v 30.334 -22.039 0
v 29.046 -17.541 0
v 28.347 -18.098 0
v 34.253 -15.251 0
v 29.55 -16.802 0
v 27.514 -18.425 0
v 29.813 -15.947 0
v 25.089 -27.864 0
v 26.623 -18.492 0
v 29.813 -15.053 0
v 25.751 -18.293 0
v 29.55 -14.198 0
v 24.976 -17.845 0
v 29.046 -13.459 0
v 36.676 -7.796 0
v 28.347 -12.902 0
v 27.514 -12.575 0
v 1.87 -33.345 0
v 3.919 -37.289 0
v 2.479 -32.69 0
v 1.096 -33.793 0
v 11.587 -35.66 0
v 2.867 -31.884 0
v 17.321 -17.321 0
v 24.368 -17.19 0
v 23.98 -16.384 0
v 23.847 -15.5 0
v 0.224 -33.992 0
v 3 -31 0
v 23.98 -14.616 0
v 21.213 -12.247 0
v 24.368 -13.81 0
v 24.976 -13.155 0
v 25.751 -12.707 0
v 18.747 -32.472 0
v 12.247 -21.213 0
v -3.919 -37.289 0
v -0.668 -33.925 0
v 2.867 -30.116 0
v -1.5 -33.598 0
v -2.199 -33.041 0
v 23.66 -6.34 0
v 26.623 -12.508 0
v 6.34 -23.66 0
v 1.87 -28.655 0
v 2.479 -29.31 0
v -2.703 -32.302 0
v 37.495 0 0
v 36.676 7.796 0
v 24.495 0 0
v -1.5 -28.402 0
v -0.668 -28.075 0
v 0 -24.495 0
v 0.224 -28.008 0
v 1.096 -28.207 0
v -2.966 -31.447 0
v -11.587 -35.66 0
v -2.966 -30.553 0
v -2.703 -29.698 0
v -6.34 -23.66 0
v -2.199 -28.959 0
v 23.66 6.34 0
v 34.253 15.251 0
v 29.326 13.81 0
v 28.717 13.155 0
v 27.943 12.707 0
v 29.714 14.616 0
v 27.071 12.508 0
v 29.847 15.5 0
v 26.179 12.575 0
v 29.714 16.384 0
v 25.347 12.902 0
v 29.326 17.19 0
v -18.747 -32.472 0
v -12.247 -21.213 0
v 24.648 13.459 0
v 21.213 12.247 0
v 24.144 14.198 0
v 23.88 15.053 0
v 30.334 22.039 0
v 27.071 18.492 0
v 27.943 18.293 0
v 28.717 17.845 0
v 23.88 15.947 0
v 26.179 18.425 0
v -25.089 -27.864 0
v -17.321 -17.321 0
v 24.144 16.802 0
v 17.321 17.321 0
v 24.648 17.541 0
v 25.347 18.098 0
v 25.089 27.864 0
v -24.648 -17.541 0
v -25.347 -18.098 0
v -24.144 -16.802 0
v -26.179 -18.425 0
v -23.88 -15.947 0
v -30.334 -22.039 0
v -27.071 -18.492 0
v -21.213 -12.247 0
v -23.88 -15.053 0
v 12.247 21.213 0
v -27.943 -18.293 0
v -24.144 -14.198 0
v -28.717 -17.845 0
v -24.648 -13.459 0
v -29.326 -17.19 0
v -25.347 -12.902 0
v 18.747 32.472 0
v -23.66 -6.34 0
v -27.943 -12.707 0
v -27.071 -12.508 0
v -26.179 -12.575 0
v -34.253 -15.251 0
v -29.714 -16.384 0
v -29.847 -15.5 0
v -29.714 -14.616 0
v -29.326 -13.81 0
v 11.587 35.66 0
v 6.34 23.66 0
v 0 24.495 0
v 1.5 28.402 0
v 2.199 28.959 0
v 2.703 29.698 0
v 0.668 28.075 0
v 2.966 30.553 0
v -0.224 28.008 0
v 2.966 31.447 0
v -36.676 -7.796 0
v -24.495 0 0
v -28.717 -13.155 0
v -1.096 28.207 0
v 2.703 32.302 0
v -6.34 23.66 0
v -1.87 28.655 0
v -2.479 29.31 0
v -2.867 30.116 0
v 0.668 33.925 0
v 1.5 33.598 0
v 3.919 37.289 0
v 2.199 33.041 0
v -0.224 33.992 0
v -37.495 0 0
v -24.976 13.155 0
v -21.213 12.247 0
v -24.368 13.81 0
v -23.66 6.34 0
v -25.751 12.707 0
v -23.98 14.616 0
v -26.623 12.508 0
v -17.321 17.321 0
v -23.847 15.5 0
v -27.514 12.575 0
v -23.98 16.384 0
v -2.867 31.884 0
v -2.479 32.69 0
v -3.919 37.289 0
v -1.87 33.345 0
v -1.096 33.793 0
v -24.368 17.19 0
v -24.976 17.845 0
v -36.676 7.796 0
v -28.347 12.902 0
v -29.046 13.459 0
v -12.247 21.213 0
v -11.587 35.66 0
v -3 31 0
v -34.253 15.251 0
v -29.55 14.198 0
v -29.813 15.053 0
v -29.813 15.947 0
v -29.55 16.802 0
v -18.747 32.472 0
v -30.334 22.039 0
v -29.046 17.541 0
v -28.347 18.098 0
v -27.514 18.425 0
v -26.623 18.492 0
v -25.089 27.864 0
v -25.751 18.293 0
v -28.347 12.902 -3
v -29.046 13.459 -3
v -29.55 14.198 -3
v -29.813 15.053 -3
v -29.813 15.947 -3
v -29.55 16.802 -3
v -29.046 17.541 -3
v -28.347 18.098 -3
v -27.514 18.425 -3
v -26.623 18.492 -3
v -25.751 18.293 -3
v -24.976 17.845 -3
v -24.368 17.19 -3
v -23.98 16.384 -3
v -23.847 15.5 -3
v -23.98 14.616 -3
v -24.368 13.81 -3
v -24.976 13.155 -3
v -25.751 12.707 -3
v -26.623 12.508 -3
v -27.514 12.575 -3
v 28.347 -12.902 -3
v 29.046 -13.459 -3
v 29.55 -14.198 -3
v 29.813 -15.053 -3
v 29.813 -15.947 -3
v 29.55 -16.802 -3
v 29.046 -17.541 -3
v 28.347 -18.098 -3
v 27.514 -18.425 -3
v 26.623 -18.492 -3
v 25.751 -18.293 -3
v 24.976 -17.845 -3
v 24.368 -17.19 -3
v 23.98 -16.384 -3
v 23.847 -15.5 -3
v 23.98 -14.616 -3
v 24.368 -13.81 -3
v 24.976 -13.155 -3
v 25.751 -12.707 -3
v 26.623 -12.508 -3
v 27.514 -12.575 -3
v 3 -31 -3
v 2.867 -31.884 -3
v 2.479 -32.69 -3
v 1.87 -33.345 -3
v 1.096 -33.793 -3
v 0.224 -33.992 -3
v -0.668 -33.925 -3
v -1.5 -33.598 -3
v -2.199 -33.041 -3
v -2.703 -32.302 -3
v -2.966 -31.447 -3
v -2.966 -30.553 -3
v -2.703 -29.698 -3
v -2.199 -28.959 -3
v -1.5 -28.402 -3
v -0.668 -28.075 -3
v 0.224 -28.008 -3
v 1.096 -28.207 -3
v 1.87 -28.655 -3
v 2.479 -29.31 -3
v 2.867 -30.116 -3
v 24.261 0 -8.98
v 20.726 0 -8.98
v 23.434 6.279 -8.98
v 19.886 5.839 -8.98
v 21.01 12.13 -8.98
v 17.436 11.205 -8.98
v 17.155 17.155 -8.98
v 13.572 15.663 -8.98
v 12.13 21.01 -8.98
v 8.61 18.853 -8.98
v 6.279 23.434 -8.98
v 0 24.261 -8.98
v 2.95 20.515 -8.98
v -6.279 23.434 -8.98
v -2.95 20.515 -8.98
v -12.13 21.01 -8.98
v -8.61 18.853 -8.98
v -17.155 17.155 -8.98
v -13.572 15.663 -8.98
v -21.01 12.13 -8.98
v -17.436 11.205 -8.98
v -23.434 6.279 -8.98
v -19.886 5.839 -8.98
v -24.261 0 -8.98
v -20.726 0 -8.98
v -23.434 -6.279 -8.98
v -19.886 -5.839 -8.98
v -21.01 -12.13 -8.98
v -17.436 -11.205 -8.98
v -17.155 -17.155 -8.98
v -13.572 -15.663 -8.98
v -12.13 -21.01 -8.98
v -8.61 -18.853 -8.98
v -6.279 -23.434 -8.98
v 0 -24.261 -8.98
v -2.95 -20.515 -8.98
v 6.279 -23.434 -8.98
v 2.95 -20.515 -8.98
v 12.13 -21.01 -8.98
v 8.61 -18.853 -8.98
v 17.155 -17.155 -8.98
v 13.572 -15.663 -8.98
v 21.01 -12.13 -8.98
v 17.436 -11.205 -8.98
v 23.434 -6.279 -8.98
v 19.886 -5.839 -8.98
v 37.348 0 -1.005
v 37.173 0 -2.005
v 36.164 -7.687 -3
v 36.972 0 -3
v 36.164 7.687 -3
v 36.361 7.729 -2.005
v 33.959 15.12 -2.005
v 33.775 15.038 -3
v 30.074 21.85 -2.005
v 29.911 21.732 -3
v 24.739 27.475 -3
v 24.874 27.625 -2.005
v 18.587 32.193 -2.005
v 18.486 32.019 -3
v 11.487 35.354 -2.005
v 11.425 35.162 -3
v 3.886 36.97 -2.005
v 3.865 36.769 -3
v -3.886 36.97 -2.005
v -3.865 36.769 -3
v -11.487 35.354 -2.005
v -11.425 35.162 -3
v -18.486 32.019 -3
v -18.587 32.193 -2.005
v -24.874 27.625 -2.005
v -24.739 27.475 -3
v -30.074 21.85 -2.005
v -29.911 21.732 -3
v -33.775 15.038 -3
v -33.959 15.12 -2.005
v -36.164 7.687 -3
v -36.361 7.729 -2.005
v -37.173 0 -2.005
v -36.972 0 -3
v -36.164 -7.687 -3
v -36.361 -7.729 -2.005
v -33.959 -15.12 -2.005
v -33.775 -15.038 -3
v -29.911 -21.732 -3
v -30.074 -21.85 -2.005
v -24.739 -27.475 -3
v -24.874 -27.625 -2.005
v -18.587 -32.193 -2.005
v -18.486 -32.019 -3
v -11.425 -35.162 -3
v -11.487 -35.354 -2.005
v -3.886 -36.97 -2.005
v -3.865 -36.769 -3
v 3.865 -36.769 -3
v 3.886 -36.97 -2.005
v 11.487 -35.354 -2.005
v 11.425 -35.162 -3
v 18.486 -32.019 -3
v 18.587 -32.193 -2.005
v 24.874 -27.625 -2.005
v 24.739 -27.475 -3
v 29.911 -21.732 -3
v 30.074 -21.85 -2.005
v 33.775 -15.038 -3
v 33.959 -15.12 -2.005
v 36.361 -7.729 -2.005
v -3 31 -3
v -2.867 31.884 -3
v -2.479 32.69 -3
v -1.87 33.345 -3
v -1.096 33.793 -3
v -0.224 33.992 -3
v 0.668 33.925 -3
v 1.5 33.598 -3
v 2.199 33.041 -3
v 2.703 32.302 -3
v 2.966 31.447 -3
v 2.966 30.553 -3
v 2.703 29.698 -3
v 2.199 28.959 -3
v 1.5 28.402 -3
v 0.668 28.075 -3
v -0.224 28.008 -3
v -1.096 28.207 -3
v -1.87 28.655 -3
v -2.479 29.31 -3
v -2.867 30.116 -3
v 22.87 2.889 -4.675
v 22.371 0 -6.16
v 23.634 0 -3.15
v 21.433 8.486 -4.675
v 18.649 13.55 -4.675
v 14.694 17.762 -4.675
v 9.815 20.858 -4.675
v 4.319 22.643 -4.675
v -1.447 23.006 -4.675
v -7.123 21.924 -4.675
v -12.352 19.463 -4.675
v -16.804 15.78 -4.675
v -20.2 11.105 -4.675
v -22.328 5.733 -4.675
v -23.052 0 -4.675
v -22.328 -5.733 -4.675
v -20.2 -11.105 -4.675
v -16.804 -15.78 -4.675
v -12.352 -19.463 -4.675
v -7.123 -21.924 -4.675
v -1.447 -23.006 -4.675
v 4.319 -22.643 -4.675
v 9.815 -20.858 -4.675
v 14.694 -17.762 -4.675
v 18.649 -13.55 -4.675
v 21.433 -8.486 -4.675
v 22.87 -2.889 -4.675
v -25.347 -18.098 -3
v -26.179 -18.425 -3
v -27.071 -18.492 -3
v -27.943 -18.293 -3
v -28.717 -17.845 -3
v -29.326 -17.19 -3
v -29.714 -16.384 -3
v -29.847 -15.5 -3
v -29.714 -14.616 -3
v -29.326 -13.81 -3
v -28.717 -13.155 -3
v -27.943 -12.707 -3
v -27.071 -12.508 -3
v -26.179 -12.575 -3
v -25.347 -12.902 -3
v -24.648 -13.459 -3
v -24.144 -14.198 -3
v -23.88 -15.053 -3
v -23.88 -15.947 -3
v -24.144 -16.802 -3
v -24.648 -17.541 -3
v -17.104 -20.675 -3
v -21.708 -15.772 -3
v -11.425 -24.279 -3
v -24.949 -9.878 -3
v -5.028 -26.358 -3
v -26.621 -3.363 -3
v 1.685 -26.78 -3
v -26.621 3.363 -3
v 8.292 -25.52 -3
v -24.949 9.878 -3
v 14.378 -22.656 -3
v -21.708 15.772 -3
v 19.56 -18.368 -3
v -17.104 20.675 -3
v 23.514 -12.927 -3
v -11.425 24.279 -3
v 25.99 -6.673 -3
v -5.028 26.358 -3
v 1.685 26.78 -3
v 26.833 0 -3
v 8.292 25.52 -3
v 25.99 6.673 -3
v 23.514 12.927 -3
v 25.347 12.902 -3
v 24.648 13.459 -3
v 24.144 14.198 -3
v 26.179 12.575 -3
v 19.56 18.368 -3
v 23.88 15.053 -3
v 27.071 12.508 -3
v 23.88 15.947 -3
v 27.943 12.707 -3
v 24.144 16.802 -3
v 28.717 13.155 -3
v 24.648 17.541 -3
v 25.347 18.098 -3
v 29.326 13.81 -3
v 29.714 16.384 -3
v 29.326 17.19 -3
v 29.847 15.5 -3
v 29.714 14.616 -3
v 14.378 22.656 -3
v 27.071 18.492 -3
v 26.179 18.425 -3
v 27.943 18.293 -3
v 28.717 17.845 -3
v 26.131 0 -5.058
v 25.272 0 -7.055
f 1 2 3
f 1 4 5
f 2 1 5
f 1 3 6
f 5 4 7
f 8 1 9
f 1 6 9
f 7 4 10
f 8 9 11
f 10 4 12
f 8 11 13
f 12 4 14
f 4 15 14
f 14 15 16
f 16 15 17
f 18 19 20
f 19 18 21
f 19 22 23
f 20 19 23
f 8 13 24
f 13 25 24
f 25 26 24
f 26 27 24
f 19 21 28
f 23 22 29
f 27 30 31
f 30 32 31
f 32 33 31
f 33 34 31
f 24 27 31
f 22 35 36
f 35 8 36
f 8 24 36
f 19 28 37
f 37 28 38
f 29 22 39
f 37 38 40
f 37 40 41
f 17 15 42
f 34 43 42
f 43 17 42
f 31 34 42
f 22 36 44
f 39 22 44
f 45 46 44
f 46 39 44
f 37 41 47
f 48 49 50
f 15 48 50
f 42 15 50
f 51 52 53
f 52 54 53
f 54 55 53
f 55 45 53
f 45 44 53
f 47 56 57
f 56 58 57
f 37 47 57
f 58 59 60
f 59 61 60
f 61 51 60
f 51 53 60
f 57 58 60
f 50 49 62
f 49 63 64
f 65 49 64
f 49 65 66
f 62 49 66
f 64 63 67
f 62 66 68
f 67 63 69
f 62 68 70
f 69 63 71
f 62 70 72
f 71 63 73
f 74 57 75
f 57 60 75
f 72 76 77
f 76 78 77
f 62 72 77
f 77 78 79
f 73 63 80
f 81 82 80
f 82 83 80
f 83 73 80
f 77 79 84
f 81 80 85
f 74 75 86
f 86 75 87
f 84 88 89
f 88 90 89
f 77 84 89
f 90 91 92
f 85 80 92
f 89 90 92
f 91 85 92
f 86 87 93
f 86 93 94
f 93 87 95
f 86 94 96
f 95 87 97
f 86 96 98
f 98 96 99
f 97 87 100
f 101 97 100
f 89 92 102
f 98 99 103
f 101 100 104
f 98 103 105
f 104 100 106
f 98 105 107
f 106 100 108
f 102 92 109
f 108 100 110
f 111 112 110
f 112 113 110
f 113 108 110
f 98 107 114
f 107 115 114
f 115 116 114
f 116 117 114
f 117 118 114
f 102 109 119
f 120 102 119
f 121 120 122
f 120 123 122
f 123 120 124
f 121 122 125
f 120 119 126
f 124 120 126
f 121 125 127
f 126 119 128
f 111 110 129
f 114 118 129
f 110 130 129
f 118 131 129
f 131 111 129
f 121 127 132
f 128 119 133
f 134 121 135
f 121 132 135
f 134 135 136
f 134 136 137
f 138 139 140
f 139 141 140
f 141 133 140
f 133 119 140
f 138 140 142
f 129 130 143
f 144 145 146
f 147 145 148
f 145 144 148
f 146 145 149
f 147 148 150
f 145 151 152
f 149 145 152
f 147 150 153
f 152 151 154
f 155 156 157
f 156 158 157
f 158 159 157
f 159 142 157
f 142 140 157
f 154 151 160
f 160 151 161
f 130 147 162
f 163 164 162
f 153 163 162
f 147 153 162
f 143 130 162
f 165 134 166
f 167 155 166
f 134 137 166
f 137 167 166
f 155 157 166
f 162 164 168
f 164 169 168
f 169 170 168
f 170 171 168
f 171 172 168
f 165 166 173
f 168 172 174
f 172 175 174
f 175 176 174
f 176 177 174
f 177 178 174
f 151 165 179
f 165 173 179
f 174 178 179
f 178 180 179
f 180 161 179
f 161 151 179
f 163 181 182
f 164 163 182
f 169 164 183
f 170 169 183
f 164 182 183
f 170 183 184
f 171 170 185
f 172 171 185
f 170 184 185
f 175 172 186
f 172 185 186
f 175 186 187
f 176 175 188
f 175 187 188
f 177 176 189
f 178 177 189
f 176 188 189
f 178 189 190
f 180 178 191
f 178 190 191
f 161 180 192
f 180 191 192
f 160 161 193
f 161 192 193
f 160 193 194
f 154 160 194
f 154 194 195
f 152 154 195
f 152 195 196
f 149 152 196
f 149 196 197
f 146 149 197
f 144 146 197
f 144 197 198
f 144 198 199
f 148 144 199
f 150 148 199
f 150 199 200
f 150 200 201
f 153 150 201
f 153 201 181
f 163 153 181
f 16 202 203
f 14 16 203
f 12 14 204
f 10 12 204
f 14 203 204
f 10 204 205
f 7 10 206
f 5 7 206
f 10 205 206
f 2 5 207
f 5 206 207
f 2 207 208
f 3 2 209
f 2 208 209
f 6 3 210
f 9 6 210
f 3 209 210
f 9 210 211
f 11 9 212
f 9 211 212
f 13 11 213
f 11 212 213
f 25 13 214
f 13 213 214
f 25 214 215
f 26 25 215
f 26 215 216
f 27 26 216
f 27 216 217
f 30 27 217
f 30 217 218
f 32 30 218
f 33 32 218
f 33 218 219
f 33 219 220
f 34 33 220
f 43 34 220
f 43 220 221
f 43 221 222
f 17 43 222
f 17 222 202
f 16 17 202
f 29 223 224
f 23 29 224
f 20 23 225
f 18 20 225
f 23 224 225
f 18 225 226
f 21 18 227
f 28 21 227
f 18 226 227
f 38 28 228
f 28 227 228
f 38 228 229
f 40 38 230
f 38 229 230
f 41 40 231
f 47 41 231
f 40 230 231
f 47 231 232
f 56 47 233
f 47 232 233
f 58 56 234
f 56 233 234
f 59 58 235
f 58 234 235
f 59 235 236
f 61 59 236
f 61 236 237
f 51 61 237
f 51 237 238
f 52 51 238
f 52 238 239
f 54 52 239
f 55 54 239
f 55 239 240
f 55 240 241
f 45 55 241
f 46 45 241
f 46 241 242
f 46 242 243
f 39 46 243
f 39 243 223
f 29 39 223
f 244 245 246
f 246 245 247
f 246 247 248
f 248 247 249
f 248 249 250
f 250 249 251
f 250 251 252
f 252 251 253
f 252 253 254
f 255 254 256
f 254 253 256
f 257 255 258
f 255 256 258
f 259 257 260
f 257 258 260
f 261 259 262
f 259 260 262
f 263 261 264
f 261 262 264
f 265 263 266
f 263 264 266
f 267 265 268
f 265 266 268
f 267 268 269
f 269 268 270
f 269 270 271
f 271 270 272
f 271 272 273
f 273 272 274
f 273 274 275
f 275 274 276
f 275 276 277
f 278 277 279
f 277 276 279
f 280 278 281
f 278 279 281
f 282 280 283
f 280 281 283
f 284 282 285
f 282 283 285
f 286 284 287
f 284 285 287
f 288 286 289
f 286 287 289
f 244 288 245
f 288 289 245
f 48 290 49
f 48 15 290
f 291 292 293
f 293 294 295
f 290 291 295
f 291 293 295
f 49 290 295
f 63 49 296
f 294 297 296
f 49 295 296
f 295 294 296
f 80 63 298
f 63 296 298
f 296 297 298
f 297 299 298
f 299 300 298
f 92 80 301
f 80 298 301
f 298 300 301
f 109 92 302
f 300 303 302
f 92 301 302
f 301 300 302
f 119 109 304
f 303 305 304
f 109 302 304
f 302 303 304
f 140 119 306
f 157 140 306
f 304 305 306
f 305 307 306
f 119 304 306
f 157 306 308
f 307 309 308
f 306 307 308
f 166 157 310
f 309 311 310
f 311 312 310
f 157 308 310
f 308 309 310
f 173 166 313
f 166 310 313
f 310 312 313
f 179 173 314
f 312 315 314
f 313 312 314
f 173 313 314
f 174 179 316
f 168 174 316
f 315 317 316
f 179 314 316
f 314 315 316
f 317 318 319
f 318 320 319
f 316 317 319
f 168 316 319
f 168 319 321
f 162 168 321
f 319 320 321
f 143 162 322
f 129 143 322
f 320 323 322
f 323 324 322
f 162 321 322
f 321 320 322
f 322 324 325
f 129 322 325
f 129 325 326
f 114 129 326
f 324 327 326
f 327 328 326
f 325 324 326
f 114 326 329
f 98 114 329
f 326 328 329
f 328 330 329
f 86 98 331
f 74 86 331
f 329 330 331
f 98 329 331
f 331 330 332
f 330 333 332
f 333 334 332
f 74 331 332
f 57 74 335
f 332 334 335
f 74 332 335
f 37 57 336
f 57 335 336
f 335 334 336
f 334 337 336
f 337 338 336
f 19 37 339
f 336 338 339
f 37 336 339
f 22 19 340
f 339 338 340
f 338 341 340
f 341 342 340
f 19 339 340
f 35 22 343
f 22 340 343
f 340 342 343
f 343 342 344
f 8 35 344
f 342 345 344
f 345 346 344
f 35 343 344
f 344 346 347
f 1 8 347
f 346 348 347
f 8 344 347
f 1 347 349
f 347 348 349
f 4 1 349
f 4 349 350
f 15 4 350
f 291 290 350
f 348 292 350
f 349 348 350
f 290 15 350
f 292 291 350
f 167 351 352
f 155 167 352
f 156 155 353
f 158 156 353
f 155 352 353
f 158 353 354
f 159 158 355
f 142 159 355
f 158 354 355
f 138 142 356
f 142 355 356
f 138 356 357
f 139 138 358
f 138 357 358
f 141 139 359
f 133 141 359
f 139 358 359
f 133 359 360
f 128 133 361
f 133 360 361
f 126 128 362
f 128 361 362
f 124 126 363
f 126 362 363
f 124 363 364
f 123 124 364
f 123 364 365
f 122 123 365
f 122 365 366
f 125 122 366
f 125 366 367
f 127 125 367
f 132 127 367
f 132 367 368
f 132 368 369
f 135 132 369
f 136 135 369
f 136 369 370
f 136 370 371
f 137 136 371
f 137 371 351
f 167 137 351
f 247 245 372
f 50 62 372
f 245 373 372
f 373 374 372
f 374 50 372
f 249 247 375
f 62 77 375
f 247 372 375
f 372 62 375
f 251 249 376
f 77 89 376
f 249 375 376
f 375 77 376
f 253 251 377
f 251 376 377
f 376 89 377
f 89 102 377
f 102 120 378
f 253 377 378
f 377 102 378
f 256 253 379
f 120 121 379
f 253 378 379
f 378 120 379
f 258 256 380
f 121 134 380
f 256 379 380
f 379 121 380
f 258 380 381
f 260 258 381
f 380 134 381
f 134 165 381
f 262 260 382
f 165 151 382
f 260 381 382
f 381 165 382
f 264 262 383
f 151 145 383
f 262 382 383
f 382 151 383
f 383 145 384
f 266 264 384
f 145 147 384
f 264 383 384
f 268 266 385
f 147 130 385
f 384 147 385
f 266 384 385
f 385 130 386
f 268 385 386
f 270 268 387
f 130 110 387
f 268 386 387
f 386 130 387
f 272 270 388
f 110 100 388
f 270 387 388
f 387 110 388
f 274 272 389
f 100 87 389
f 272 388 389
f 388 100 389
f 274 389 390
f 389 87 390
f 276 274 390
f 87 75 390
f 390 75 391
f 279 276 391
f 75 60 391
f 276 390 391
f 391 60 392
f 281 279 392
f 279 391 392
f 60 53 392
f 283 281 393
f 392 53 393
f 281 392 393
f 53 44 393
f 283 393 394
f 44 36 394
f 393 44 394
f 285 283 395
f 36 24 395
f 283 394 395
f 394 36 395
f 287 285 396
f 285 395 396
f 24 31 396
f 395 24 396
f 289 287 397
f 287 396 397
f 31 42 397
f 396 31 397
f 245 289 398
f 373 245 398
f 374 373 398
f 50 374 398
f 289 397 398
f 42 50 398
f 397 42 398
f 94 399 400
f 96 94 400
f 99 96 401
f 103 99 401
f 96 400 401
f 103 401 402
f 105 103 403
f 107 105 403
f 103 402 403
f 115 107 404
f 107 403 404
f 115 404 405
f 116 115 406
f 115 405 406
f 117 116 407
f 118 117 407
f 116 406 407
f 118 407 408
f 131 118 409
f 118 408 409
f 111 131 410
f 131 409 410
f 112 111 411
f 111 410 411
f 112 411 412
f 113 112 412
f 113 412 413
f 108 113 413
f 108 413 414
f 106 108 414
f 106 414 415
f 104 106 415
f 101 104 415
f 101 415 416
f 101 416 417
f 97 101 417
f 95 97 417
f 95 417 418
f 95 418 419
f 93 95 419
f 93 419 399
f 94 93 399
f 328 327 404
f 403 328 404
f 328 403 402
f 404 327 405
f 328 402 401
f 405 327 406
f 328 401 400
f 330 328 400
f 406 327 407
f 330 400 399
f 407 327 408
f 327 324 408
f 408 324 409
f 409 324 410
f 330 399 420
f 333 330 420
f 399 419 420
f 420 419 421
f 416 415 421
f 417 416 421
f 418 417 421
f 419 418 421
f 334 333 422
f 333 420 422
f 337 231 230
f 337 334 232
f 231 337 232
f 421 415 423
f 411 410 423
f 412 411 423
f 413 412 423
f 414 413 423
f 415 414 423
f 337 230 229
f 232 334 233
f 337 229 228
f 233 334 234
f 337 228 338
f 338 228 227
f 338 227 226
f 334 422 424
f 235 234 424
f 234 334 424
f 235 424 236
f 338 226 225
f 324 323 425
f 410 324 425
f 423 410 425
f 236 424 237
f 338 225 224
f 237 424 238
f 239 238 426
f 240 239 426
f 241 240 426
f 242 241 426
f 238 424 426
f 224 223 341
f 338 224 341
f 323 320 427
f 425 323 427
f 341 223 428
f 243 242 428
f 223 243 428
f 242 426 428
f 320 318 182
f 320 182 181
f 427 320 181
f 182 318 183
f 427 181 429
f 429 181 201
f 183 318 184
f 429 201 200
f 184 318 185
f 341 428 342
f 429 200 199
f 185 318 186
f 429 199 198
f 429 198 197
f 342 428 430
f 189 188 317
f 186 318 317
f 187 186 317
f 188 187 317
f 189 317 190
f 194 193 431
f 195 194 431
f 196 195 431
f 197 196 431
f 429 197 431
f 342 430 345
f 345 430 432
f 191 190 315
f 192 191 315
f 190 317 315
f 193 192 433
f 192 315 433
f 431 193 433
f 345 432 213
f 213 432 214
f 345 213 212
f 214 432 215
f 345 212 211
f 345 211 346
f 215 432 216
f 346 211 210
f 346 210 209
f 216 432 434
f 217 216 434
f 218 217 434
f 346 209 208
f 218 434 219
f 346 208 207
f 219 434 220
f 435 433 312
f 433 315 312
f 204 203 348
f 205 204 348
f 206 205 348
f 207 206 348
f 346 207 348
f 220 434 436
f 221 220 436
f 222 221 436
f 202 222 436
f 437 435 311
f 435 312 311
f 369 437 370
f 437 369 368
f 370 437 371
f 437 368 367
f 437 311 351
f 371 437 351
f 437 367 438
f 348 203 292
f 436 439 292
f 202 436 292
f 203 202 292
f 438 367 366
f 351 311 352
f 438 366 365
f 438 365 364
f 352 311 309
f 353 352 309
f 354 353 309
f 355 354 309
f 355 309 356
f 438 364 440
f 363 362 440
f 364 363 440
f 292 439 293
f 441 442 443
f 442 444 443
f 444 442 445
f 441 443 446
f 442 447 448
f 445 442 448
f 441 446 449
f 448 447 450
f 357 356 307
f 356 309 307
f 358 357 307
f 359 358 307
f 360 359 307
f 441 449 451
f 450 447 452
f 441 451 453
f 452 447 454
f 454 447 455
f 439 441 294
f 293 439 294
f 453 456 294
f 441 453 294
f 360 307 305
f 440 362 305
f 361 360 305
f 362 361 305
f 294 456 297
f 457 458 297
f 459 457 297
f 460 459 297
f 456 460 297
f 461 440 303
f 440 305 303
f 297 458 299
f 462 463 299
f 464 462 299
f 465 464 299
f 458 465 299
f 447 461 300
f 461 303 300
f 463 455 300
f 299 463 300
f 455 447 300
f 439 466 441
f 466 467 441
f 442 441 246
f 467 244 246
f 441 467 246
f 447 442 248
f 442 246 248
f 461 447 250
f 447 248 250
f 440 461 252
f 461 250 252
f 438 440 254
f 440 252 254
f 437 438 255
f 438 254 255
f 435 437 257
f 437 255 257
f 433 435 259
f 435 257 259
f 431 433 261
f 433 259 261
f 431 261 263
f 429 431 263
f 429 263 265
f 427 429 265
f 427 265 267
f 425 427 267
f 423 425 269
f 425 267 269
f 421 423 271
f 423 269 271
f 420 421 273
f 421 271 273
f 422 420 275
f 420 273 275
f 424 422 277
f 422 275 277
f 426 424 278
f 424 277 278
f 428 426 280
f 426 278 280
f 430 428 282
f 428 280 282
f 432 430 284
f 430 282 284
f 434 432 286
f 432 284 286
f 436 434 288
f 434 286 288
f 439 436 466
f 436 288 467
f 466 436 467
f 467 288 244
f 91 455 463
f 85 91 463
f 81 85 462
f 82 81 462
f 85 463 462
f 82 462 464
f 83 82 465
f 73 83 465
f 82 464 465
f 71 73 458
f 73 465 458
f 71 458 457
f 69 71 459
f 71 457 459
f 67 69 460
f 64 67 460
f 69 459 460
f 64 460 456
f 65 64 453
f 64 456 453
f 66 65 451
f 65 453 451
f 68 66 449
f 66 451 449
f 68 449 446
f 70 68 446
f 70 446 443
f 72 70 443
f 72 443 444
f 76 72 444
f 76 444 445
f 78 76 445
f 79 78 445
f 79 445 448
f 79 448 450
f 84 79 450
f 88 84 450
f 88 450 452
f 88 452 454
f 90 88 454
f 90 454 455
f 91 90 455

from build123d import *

# Parameters (mm, degrees)
SKETCH8_R          = 3
CUT_EXTRUDE3_DEPTH = 10
CIRPATTERN2_COUNT  = 6


with BuildPart() as part:
    # Sketch1 → Revolve1 (revolve)
    with BuildSketch(Plane(origin=(0, 0, 0), x_dir=(1, 0, 0), z_dir=(0, 1, 0))):
        with BuildLine():
            Line((24.494897428, 0), (37.494897428, 0))
            ThreePointArc((37.494897428, 0), (37.263758056, 1.505294975), (36.971875785, 3))
            Line((36.971875785, 3), (26.83281573, 3))
            ThreePointArc((26.83281573, 3), (25.72101407, 6.06478356), (24.260502346, 8.979557429))
            Line((24.260502346, 8.979557429), (20.725653382, 8.980246488))
            ThreePointArc((20.725653382, 8.980246488), (23.051806017, 4.675445176), (24.494897428, 0))
        make_face()
    revolve(axis=Axis((0, 0, -42.340685112), (0, 0, 1)))

    # Sketch8 → Cut-Extrude3 (cut)
    with BuildSketch(Plane(origin=(0, 0, -3), x_dir=(-1, 0, 0), z_dir=(0, 0, -1))):
        with Locations((0, 31)):
            Circle(SKETCH8_R)
    cut_extrude3 = extrude(amount=-CUT_EXTRUDE3_DEPTH, mode=Mode.SUBTRACT)

    # CirPattern2: Cut-Extrude3 ×6 about axis
    cirpattern2_axis = Axis((0, 0, 0), (0, 0, 1))
    for i in range(1, CIRPATTERN2_COUNT):
        add(cut_extrude3.rotate(cirpattern2_axis, i * 360 / CIRPATTERN2_COUNT), mode=Mode.SUBTRACT)


solid = part.part
